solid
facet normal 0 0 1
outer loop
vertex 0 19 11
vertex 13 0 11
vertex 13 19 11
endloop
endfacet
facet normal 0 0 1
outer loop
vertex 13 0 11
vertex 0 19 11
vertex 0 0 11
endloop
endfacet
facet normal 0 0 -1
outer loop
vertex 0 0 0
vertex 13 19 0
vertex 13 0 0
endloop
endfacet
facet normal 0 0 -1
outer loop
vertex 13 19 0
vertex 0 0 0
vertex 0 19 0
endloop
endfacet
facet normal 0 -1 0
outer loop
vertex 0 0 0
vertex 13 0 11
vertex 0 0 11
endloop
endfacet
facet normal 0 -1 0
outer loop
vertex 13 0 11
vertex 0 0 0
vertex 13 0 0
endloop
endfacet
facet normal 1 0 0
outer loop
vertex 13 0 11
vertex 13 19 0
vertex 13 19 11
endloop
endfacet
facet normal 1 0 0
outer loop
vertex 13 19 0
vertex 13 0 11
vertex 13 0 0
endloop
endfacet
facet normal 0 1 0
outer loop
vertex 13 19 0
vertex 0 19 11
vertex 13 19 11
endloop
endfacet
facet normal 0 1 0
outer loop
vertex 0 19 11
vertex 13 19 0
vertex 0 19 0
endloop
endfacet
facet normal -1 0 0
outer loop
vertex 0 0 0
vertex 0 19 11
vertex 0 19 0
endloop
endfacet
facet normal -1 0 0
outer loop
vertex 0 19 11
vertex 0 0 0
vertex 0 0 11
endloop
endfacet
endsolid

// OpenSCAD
// Generated by SolidPython 1.0.1 on 2020-07-29 00:46:55


cube(size = [13, 19, 11]);
/***********************************************
*********      SolidPython code:      **********
************************************************
 
# import packages: SolidPython
from solid import *
from solid.utils import *
from itertools import chain, combinations, permutations


class Resize:

    def __init__(self, scad_file):
        self.scad_file = scad_file
        #self.scad_file = import_scad(scad_file)
        # cone/cylinder param:
        self.r1 = 0
        self.r2 = 0
        self.h = 0
        # rectangular prism param:
        self.w = 0
        self.l = 0
        # ellipse param:
        self.r = 0

    # import OpenScad code (file name corresponds to shape)


    # classify shape + parameters
    def assign(self, param1, param2, param3):
        if self.scad_file == 'cone.scad':
            self.r1 = param1
            self.r2 = param2
            self.h = param3
        elif self.scad_file == 'cylinder.scad':
            self.r1 = param1
            self.r2 = param2
            self.h = param3
        elif self.scad_file == 'rectangularPrism.scad':
            self.h = param1
            self.l = param2
            self.w = param3
        else:
            self.r = param1
            self.h = param2

    # resize parameters
    def iterate(self):
        x = range(3, 20, 2)
        i = 1
        if self.scad_file == 'cone.scad':
            tempList = list(permutations(x, 2))
            for temp in tempList:
                param1 = temp[0]
                param2 = temp[1]
                filepath = 'produced_scad_files/' + 'cone' + str(param1) + '_' + str(param2) + '_' + '.scad'
                scad_render_to_file(cylinder(h=param1, r1=param2, r2=0), filepath)

        elif self.scad_file == 'cylinder.scad':
            tempList = list(permutations(x, 3))
            for temp in tempList:
                param1 = temp[0]
                param2 = temp[1]
                filepath = 'produced_scad_files/' + 'cylinder' + str(param1) + '_' + str(param2) + '_' + '.scad'
                scad_render_to_file(cylinder(h=param1, r1=param2, r2=param2), filepath)

        elif self.scad_file == 'rectangularPrism.scad':
            tempList = list(permutations(x, 3))
            for temp in tempList:
                param1 = temp[0]
                param2 = temp[1]
                param3 = temp[2]
                filepath = 'produced_scad_files/' + 'rectangularPrism' + str(param1) + '_' + str(param2) + '_' + str(
                    param3) + '.scad'
                scad_render_to_file(cube(size=(param1, param2, param3)), filepath)

        elif self.scad_file == 'ellipse.scad':
            tempList = list(permutations(x, 4))
            for temp in tempList:
                param1 = temp[0]
                param2 = temp[1]
                param3 = temp[2]
                param4 = temp[3]
                filepath = 'produced_scad_files/' + 'ellipse' + str(param1) + '_' + str(param2) + '_' + str(param3) + '_' + str(param4) + '.scad'
                scad_render_to_file(scale([param1, param2, param3])(sphere(r=param4)), filepath)

    def render_to_scadfile(self):
        scad_render_to_file(scad, 'example.scad') 
 
************************************************/
